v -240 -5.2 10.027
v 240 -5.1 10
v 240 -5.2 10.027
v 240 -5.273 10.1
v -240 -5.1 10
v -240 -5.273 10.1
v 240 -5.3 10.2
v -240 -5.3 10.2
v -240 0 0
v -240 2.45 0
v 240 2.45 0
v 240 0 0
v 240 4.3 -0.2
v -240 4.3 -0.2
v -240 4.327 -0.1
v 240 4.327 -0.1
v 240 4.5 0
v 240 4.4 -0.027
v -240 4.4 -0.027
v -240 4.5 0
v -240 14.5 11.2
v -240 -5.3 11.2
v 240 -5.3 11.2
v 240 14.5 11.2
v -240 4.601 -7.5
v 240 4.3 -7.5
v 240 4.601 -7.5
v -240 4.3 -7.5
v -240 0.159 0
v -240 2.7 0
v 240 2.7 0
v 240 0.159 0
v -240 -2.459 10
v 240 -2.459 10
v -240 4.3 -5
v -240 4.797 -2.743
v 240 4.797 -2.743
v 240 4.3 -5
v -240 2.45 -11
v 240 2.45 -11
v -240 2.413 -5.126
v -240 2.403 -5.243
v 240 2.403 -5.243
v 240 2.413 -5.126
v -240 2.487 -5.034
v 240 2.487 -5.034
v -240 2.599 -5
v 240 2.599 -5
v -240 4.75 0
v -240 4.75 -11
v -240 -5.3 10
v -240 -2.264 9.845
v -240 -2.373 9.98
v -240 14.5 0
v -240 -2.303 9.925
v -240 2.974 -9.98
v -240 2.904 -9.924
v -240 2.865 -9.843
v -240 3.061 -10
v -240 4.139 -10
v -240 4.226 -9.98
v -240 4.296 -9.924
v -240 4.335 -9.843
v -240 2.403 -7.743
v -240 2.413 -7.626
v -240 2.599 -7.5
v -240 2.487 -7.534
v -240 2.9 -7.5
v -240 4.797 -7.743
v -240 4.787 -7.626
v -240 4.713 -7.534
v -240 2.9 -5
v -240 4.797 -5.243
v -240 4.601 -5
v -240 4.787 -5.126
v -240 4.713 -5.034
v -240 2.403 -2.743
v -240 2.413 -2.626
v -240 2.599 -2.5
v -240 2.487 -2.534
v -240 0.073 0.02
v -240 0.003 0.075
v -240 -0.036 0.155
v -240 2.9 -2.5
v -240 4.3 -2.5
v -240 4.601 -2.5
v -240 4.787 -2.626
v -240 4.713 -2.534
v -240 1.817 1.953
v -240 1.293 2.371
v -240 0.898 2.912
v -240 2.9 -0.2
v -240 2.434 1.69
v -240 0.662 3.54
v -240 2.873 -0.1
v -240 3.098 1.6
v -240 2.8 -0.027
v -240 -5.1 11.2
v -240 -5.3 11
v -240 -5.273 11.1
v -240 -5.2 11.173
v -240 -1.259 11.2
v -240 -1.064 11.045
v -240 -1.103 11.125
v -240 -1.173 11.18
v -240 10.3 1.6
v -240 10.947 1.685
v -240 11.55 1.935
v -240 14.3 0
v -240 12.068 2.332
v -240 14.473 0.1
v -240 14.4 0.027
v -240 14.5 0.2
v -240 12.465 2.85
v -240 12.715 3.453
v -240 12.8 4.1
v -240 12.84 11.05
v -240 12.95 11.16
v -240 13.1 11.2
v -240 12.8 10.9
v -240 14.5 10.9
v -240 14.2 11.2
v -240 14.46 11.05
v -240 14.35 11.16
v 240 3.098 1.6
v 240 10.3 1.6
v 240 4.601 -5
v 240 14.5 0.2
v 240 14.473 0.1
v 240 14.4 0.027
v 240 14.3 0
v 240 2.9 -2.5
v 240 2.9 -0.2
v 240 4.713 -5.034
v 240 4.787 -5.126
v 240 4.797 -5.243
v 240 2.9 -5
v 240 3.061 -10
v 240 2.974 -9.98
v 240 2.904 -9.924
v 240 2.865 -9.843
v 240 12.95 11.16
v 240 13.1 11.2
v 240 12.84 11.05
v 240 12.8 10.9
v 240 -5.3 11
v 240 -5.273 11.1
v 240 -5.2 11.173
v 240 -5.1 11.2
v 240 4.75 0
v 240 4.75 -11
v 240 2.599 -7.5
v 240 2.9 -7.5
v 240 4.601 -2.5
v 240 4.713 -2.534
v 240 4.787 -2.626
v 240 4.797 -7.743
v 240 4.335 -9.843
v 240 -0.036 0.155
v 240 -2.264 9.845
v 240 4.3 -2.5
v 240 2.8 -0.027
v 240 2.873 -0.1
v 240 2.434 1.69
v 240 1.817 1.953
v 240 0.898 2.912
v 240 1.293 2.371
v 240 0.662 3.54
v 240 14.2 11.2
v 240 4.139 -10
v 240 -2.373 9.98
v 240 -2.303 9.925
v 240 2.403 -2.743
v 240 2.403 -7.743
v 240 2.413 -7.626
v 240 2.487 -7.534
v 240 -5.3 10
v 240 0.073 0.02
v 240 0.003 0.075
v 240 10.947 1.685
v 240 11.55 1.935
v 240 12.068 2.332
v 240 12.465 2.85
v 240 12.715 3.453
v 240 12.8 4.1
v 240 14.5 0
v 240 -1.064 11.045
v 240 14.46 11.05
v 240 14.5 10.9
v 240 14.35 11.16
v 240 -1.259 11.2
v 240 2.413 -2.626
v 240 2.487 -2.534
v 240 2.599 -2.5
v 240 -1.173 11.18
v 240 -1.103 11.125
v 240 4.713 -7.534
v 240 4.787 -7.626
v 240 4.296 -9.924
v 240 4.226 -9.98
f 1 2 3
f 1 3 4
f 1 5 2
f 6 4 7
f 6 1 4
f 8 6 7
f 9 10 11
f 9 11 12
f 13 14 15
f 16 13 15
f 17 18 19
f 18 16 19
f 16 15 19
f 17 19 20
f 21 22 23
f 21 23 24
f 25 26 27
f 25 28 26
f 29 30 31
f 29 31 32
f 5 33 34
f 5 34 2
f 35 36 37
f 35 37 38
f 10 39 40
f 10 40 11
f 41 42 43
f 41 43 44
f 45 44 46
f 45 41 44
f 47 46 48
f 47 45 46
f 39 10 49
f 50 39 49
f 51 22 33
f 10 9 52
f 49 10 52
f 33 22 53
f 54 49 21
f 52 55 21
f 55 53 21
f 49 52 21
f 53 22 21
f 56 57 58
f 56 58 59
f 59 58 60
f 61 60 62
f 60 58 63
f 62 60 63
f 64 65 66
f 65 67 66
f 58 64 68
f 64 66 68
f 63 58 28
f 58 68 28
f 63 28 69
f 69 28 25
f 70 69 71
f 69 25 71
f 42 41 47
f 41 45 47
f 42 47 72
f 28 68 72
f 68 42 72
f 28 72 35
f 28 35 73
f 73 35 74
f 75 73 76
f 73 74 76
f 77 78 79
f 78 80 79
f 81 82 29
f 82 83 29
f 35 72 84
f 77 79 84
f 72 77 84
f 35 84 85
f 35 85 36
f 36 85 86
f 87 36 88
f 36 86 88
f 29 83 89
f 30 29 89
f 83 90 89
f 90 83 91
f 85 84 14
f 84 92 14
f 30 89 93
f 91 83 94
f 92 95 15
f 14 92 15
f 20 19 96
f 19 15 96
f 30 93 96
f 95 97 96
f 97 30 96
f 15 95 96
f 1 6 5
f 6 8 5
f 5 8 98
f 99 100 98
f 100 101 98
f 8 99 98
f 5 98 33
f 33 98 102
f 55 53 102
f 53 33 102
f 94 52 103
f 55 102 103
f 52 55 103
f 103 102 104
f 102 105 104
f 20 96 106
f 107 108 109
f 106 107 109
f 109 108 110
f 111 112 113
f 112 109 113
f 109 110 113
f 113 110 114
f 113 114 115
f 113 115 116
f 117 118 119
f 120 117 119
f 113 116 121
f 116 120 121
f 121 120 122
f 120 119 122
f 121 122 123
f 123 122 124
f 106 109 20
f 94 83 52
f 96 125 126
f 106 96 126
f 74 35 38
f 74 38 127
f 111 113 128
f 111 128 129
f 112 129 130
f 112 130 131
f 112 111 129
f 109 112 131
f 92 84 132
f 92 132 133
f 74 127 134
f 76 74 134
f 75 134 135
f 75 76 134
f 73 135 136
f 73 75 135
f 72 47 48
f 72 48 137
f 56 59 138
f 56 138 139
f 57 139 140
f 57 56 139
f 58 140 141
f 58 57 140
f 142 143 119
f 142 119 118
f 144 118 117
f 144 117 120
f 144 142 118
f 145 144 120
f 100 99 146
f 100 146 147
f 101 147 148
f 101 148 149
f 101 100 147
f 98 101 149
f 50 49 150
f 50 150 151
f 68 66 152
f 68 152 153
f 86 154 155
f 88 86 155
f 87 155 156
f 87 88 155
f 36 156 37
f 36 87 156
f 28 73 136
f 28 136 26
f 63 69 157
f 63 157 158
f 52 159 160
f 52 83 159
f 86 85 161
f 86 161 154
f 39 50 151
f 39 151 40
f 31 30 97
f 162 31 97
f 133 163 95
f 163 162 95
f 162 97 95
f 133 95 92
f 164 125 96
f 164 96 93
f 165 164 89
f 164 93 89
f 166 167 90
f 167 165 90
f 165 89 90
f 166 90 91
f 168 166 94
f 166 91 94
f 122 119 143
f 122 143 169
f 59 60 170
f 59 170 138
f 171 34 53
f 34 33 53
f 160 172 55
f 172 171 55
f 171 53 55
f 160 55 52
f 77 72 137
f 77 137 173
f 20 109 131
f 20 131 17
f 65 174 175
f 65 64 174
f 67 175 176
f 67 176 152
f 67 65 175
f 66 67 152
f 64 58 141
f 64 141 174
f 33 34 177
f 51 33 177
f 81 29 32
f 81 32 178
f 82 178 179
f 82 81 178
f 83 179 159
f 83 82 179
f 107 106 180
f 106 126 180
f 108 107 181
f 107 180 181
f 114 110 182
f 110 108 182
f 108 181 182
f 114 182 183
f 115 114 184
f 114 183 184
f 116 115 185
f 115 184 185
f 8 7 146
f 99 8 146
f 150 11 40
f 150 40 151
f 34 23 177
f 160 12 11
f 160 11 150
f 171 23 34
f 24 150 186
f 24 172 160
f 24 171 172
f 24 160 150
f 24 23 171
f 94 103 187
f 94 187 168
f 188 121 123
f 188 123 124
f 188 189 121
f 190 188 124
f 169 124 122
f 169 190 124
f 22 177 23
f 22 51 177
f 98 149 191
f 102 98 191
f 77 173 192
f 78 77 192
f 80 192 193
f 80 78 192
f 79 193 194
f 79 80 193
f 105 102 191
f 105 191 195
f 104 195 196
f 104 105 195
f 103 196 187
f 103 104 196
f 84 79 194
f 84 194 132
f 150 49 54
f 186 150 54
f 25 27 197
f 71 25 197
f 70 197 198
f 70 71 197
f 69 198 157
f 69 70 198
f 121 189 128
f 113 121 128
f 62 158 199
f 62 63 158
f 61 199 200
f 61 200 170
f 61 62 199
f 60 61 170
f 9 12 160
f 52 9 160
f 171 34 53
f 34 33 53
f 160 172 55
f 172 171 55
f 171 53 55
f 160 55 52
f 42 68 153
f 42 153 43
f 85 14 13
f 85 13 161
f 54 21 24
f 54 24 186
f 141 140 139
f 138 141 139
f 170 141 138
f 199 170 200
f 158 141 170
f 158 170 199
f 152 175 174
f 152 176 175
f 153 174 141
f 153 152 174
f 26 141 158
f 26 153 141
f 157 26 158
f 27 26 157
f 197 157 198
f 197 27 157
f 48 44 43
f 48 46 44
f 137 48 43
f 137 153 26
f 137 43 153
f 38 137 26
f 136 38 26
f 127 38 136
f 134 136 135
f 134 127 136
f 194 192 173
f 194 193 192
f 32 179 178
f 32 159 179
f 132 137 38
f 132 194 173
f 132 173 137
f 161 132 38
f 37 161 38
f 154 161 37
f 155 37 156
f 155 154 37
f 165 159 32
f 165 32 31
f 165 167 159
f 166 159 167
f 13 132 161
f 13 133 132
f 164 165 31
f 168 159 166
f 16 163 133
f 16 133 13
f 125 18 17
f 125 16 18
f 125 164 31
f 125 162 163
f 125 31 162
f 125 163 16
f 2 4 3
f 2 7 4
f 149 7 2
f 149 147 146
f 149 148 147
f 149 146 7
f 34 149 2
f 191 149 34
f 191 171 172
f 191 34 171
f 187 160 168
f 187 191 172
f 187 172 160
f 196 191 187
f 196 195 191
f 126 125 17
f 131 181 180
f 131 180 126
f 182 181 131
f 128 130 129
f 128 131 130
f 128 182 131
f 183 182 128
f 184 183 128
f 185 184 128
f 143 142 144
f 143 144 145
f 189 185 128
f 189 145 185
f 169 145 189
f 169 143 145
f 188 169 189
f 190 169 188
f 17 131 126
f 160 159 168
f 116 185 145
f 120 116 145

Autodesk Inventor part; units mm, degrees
ref_plane "YZ Plane" through (0, 0, 0) normal (1, 0, 0) x (0, 1, 0)
ref_plane "XZ Plane" through (0, 0, 0) normal (0, 1, 0) x (-1, 0, 0)
ref_plane "XY Plane" through (0, 0, 0) normal (0, 0, 1) x (1, 0, 0)
sketch "Sketch1" plane through (0, 0, 0) normal (1, 0, 0) x (0, 1, 0)
  line L0 (14.5, 11.2) -> (14.5, 0)
  line L1 (14.5, 0) -> (4.3, 0)
  line L2 (4.3, 0) -> (4.3, -2.5)
  line L3 (4.3, -2.5) -> (4.85, -2.5)
  line L4 (4.85, -2.5) -> (4.3, -5)
  line L5 (4.3, -5) -> (4.85, -5)
  line L6 (4.85, -5) -> (4.3, -7.5)
  line L7 (4.3, -7.5) -> (4.85, -7.5)
  line L8 (4.85, -7.5) -> (4.3, -10)
  line L9 (4.3, -10) -> (2.9, -10)
  line L10 (2.9, -10) -> (2.35, -7.5)
  line L11 (2.35, -7.5) -> (2.9, -7.5)
  line L12 (2.9, -7.5) -> (2.35, -5)
  line L13 (2.35, -5) -> (2.9, -5)
  line L14 (2.9, -5) -> (2.35, -2.5)
  line L15 (2.35, -2.5) -> (2.9, -2.5)
  line L16 (2.9, -2.5) -> (2.9, 0)
  line L17 (2.9, 0) -> (0, 0)
  line L18 (0, 0) -> (-2.3, 10)
  line L19 (-2.3, 10) -> (-5.3, 10)
  line L20 (-5.3, 10) -> (-5.3, 11.2)
  line L21 (-5.3, 11.2) -> (-1.1, 11.2)
  line L22 (-1.1, 11.2) -> (1.108, 1.6)
  line L23 (1.108, 1.6) -> (12.8, 1.6)
  line L24 (12.8, 1.6) -> (12.8, 11.2)
  line L25 (12.8, 11.2) -> (14.5, 11.2)
  dimension "d0" = 1.7
  dimension "d1" = 1.2
  dimension "d2" = 4.2
  dimension "d3" = 3
  dimension "d4" = 5.3
  dimension "d6" = 10
  dimension "d7" = 10
  dimension "d8" = 2.5
  dimension "d9" = 7.65
  dimension "d10" = 19.8
  dimension "d11" = 2.5
  dimension "d12" = 0.55
  dimension "d13" = 1.6
extrude "01_ex1" add sketch "Sketch1" along normal mid plane 480
fillet "01_fillet1" radius 2.5 2 edges at (0, 12.8, 1.6) (0, 1.108, 1.6)
fillet "01_fillet1" radius 0.3 2 edges at (0, 12.8, 11.2) (0, 14.5, 11.2)
fillet "01_fillet1" radius 0.2 16 edges at (0, -1.1, 11.2) (0, -5.3, 11.2) (0, -5.3, 10) (0, -2.3, 10) (0, 0, 0) (0, 2.9, 0) (0, 2.35, -2.5) (0, 2.35, -5) (0, 2.35, -7.5) (0, 2.9, -10) (0, 4.3, -10) (0, 4.85, -7.5) (0, 4.85, -5) (0, 4.85, -2.5) (0, 4.3, 0) (0, 14.5, 0)
sketch "Sketch2" plane through (0, 0, 0) normal (1, 0, 0) x (0, 1, 0)
  line L0 (4.75, 0) -> (4.75, -11)
  line L1 (4.75, -11) -> (2.45, -11)
  line L2 (2.45, -11) -> (2.45, 0)
  line L3 (3.0608, -10) -> (4.1392, -10) projected
  line L4 (4.5, 0) -> (14.3, 0) projected
  line L5 (2.45, 0) -> (0, 0)
  line L6 (0, 0) -> (-2.2643, 9.8448)
  arc A0 (-2.2643, 9.8448) -> (-2.4592, 10) centre (-2.4592, 9.8) ccw
  line L7 (-2.4592, 10) -> (-5.3, 10)
  line L8 (-5.3, 10) -> (-5.3, 11.2)
  line L9 (-5.3, 11.2) -> (14.5, 11.2)
  line L10 (14.5, 11.2) -> (14.5, 0)
  line L11 (14.5, 0) -> (4.75, 0)
  line L12 (-2.2643, 9.8448) -> (-0.0357, 0.1552) projected
  line L13 (-5.1, 10) -> (-2.4592, 10) projected
  arc A1 (-2.2643, 9.8448) -> (-2.4592, 10) centre (-2.4592, 9.8) ccw projected
  line L14 (-5.3, 11) -> (-5.3, 10.2) projected
  line L15 (-1.2592, 11.2) -> (-5.1, 11.2) projected
  line L16 (14.5, 0.2) -> (14.5, 10.9) projected
  line L17 (0.1592, 0) -> (2.7, 0) projected
  point P0 (0, 0)
  point P1 (3.6, -11)
  point P2 (3.6, -10)
  dimension "d19" = 2.3
  dimension "d20" = 1
extrude "02_ex1" add sketch "Sketch2" along normal mid plane 480 separate body
equation "\"d14\" = Length"
equation "\"d21\" = Length"
equation "\"Length\" = 480"
properties part number "Hafele alu 126_13" material "Aluminum 6061"
